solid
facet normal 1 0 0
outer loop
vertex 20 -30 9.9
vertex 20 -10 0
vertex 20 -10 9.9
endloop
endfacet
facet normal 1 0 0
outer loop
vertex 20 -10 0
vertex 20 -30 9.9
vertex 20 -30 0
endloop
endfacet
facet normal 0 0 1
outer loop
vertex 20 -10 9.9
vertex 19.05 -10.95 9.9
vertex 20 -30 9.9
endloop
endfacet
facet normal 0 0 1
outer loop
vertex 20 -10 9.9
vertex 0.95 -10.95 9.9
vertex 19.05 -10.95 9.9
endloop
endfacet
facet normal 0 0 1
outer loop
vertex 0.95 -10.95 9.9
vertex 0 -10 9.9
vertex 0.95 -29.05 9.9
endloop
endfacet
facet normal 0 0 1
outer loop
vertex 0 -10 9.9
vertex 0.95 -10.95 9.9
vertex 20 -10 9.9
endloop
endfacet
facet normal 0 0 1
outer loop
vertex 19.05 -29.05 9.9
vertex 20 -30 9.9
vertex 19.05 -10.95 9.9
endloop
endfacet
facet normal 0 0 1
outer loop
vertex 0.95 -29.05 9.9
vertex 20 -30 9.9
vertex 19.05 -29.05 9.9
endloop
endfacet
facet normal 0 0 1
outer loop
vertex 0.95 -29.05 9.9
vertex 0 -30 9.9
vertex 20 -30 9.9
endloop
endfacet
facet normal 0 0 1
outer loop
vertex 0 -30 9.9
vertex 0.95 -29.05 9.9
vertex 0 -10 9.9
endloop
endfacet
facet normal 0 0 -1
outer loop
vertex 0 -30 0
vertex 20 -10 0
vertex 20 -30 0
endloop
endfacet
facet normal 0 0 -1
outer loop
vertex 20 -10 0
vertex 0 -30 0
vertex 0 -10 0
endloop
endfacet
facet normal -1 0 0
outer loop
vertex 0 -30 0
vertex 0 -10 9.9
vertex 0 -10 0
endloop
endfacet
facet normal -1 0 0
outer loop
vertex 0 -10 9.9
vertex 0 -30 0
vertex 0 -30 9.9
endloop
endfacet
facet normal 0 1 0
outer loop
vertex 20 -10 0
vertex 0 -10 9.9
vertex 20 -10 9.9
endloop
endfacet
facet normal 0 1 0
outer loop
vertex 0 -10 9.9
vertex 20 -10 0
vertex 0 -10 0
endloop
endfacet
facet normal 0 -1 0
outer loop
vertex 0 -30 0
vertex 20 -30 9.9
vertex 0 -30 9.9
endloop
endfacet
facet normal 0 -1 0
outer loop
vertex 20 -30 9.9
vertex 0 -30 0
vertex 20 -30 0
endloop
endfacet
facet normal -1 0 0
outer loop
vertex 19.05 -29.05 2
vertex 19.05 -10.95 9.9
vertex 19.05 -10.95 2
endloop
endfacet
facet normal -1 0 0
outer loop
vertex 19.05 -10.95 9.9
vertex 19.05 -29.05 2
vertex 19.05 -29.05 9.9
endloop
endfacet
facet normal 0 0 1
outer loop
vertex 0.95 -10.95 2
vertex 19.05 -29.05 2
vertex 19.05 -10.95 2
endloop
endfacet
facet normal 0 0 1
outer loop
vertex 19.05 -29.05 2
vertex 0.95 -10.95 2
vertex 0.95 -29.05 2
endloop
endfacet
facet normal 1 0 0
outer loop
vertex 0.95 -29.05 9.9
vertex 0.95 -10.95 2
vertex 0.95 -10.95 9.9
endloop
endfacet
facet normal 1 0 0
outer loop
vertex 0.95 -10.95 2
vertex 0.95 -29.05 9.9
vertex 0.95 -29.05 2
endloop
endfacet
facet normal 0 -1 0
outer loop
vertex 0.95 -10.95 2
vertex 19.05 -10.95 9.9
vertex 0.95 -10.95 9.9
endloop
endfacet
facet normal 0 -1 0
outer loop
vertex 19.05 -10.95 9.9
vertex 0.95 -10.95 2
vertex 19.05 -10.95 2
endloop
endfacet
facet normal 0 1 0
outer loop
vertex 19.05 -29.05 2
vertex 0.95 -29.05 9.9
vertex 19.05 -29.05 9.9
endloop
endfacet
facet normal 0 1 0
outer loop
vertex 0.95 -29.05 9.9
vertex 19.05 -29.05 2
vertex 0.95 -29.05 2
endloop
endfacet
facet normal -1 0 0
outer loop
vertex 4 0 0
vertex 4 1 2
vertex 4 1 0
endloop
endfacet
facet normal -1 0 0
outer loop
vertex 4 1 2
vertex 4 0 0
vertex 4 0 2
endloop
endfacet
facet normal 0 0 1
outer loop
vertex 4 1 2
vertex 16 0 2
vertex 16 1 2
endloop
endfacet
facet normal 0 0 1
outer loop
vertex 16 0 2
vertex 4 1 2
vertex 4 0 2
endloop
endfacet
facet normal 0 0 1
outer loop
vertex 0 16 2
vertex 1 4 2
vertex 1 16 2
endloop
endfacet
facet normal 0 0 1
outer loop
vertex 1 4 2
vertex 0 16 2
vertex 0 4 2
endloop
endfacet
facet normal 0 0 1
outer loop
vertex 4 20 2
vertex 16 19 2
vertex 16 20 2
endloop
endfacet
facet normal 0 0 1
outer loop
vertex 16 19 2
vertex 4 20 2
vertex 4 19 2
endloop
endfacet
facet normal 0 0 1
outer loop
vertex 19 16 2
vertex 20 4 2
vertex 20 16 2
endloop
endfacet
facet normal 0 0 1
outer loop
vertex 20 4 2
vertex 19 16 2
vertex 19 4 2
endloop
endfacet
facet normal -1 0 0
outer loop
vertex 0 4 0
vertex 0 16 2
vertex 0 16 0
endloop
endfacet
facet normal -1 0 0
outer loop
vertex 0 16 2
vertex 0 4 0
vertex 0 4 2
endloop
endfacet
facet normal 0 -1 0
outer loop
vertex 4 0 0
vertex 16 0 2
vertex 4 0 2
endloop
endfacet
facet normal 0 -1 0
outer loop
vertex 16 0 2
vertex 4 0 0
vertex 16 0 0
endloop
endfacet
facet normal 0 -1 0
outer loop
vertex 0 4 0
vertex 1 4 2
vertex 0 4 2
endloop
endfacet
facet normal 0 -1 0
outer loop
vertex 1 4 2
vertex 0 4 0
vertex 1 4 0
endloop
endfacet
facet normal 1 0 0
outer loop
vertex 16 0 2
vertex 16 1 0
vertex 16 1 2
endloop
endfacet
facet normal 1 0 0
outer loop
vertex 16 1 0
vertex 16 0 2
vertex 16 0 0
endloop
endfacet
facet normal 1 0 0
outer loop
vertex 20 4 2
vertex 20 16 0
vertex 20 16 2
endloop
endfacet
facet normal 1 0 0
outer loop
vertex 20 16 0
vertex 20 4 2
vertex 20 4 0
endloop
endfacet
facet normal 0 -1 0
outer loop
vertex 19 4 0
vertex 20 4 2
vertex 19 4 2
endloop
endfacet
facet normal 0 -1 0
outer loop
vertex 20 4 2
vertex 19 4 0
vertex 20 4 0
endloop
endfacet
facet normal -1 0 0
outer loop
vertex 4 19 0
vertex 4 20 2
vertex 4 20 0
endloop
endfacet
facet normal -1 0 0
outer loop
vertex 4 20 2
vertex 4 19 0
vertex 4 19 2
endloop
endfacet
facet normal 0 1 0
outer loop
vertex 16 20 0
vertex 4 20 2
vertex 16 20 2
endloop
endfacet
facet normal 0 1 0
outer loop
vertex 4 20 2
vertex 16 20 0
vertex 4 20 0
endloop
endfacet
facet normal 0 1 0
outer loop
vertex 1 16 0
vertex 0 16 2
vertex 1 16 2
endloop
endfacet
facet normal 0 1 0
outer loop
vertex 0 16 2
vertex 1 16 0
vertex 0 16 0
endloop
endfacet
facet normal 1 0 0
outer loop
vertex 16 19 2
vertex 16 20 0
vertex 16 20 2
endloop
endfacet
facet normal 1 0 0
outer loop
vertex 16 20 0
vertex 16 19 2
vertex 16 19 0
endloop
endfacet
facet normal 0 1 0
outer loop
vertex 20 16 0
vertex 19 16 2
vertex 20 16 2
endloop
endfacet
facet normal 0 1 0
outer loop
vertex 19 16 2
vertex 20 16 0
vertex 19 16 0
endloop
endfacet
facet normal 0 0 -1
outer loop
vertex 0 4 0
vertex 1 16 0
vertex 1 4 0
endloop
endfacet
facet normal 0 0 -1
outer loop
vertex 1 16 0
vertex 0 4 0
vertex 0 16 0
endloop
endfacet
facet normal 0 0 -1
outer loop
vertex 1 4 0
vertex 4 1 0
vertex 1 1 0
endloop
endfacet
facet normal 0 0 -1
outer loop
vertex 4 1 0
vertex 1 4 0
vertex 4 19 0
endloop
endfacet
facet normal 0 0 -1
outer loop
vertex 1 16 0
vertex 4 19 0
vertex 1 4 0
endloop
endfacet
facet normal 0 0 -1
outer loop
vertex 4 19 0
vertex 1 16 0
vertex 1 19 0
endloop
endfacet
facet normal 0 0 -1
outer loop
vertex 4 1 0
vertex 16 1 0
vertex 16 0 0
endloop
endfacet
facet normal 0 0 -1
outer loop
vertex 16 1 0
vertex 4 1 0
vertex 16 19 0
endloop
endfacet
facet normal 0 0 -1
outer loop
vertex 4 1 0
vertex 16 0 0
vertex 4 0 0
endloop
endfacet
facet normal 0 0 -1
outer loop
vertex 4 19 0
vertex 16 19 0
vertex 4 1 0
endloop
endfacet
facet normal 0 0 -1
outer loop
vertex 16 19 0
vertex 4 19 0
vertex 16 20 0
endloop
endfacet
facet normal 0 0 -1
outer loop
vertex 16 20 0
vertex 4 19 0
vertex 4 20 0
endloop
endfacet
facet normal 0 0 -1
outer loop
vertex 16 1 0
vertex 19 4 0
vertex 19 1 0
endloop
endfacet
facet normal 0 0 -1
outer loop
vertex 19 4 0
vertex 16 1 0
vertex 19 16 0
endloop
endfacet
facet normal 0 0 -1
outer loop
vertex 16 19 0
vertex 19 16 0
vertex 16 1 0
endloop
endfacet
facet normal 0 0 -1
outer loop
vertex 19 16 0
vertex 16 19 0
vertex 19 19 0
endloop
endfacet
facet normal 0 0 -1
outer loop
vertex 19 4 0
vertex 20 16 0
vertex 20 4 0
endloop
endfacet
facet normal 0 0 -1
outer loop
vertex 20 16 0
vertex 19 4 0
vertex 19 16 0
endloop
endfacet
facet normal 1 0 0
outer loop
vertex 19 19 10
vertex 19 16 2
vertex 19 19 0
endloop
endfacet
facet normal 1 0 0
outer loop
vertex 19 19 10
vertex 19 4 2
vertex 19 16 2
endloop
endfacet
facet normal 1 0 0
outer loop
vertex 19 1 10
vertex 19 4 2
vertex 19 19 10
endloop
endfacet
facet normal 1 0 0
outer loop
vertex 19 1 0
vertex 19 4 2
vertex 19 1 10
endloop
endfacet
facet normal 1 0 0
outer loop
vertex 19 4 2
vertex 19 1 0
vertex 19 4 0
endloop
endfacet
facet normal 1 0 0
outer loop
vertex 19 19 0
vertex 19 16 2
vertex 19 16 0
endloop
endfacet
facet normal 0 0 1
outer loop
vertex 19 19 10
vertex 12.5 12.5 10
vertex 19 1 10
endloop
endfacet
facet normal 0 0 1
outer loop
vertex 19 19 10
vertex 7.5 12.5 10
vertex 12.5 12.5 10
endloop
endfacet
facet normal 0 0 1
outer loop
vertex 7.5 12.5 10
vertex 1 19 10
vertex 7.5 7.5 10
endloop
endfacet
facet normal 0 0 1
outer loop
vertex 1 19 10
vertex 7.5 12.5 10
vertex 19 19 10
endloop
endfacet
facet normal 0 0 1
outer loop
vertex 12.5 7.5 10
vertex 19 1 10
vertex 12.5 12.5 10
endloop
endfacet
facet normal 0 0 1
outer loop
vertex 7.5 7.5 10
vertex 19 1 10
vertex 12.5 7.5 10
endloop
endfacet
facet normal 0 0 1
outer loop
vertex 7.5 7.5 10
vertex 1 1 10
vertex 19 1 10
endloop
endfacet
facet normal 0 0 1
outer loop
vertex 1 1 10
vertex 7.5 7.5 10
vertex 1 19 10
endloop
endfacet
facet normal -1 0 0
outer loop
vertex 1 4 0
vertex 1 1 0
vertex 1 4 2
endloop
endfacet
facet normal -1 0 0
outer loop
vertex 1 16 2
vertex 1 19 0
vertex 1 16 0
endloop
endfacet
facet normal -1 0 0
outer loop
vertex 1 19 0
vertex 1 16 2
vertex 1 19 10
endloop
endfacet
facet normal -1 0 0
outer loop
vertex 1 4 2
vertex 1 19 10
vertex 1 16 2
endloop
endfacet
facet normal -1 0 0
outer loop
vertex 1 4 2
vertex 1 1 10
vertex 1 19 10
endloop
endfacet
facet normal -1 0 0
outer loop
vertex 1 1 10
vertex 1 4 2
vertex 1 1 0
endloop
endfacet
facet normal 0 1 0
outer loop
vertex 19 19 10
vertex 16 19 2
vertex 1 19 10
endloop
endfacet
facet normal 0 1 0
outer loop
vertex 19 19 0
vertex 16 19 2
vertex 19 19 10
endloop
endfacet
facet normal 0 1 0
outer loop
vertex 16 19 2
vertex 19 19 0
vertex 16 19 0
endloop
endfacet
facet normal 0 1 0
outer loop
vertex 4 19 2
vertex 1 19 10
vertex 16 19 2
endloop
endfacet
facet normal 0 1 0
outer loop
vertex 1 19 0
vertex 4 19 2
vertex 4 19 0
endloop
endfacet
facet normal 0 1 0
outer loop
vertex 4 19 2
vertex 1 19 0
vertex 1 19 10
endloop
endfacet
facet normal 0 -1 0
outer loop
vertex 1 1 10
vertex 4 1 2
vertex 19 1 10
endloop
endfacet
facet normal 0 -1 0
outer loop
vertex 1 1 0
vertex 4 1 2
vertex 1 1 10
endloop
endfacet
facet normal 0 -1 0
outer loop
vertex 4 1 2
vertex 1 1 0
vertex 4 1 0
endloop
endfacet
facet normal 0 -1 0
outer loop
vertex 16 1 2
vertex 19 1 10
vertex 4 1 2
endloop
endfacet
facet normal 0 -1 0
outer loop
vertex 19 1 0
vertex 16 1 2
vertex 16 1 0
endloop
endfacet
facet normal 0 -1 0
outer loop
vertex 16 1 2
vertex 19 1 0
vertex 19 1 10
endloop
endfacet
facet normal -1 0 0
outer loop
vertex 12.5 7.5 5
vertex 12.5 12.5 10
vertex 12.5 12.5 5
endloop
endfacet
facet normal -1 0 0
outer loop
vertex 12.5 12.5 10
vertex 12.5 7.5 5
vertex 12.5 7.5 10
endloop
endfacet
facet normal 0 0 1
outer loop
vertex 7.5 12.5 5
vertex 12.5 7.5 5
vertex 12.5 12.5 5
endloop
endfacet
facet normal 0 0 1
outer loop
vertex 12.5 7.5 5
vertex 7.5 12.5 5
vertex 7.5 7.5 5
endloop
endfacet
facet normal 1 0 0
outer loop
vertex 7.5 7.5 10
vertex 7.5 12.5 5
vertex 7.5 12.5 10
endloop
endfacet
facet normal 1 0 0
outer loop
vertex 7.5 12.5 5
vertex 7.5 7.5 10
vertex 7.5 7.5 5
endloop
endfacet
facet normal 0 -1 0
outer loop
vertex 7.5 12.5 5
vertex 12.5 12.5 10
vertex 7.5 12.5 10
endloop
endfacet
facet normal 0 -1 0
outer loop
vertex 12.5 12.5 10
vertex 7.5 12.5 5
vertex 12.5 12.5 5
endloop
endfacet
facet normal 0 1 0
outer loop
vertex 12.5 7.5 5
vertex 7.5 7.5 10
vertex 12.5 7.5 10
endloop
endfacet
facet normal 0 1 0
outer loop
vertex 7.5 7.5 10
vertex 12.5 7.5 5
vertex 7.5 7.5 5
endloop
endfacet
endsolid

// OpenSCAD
include <boardgame_insert_toolkit_lib.scad>;


data =
[
    [   "a card box",
        [
            [ "box_dimensions",                             [90.0, 120.0, 30.0] ],      // float f -- default:[ 100, 100, 100]
            [ "enabled",                                    true ],

            [   "components",
                [
                    [   "cards",
                        [
                            ["type",                        "cards"],                   // "cards" | "tokens" | "chit_stack" | "" -- default: ""
                            ["compartment_size",            [ 40, 40.0, 20.0] ],        // float f -- default:[ 10, 10, 10]
                            ["num_compartments",            [2, 2] ],                   // int i -- default: [1, 1]
                            ["enabled",                     true ],                     // true | false
                            ["rotation",                    0 ],                        // 0 | 1
                            ["position",                    ["center","center"]]        // float f | "center" | "max" -- default: "center"
                        ]
                    ],
                ]
            ]
        ]
    ],
    [   "a generic token box",
        [
            [ "box_dimensions",                             [60.0, 120.0, 30.0] ],
            [ "enabled",                                    true ],

            [   "components",
                [
                    [   "my chits",
                        [
                            ["type",                        "tokens"],
                            ["compartment_size",            [ 26, 40.0, 20.0] ],
                            ["num_compartments",            [2, 2] ], 
                        ]
                    ],
                ]
            ]
        ]
    ],
    [   "a round chit stack box",
        [
            [ "box_dimensions",                             [60.0, 120.0, 30.0] ], 
            [ "enabled",                                    true ],

            [   "components",
                [
                    [   "my chit stack",
                        [
                            ["type",                        "chit_stack"],
                            ["compartment_size",            [ 20, 40.0, 20.0] ], 
                            ["num_compartments",            [2, 2] ], 
                            ["shape",                       "circle"],              // "circle" | "hex"
                        ]
                    ],
                ]
            ]
        ]
    ],
    [   "a hex tile stack box",
        [
            [ "box_dimensions",                             [60.0, 120.0, 30.0] ], 
            [ "enabled",                                    true ],

            [   "components",
                [
                    [   "my chit stack",
                        [
                            ["type",                        "chit_stack"],
                            ["compartment_size",            [ 20, 40.0, 20.0] ], 
                            ["num_compartments",            [2, 2] ], 
                            ["shape",                       "hex"],
                        ]
                    ],
                ]
            ]
        ]
    ],

    [   "a simple box",
        [
            [ "box_dimensions",                             [20.0, 20.0, 10.0] ], 
            [ "enabled",                                    true ],

            [   "components",
                [
                    [   "my chit stack",
                        [
                            ["type",                        ""],
                            ["compartment_size",            [ 5, 5.0, 5.0] ], 
                            ["num_compartments",            [1, 1] ], 
                        ]
                    ],
                ]
            ]
        ]
    ],
];


// for printing control.
b_print_lid = true;
b_print_box = true;

b_print_box = "a simple box"; // isolate one box to print

MakeAll();
